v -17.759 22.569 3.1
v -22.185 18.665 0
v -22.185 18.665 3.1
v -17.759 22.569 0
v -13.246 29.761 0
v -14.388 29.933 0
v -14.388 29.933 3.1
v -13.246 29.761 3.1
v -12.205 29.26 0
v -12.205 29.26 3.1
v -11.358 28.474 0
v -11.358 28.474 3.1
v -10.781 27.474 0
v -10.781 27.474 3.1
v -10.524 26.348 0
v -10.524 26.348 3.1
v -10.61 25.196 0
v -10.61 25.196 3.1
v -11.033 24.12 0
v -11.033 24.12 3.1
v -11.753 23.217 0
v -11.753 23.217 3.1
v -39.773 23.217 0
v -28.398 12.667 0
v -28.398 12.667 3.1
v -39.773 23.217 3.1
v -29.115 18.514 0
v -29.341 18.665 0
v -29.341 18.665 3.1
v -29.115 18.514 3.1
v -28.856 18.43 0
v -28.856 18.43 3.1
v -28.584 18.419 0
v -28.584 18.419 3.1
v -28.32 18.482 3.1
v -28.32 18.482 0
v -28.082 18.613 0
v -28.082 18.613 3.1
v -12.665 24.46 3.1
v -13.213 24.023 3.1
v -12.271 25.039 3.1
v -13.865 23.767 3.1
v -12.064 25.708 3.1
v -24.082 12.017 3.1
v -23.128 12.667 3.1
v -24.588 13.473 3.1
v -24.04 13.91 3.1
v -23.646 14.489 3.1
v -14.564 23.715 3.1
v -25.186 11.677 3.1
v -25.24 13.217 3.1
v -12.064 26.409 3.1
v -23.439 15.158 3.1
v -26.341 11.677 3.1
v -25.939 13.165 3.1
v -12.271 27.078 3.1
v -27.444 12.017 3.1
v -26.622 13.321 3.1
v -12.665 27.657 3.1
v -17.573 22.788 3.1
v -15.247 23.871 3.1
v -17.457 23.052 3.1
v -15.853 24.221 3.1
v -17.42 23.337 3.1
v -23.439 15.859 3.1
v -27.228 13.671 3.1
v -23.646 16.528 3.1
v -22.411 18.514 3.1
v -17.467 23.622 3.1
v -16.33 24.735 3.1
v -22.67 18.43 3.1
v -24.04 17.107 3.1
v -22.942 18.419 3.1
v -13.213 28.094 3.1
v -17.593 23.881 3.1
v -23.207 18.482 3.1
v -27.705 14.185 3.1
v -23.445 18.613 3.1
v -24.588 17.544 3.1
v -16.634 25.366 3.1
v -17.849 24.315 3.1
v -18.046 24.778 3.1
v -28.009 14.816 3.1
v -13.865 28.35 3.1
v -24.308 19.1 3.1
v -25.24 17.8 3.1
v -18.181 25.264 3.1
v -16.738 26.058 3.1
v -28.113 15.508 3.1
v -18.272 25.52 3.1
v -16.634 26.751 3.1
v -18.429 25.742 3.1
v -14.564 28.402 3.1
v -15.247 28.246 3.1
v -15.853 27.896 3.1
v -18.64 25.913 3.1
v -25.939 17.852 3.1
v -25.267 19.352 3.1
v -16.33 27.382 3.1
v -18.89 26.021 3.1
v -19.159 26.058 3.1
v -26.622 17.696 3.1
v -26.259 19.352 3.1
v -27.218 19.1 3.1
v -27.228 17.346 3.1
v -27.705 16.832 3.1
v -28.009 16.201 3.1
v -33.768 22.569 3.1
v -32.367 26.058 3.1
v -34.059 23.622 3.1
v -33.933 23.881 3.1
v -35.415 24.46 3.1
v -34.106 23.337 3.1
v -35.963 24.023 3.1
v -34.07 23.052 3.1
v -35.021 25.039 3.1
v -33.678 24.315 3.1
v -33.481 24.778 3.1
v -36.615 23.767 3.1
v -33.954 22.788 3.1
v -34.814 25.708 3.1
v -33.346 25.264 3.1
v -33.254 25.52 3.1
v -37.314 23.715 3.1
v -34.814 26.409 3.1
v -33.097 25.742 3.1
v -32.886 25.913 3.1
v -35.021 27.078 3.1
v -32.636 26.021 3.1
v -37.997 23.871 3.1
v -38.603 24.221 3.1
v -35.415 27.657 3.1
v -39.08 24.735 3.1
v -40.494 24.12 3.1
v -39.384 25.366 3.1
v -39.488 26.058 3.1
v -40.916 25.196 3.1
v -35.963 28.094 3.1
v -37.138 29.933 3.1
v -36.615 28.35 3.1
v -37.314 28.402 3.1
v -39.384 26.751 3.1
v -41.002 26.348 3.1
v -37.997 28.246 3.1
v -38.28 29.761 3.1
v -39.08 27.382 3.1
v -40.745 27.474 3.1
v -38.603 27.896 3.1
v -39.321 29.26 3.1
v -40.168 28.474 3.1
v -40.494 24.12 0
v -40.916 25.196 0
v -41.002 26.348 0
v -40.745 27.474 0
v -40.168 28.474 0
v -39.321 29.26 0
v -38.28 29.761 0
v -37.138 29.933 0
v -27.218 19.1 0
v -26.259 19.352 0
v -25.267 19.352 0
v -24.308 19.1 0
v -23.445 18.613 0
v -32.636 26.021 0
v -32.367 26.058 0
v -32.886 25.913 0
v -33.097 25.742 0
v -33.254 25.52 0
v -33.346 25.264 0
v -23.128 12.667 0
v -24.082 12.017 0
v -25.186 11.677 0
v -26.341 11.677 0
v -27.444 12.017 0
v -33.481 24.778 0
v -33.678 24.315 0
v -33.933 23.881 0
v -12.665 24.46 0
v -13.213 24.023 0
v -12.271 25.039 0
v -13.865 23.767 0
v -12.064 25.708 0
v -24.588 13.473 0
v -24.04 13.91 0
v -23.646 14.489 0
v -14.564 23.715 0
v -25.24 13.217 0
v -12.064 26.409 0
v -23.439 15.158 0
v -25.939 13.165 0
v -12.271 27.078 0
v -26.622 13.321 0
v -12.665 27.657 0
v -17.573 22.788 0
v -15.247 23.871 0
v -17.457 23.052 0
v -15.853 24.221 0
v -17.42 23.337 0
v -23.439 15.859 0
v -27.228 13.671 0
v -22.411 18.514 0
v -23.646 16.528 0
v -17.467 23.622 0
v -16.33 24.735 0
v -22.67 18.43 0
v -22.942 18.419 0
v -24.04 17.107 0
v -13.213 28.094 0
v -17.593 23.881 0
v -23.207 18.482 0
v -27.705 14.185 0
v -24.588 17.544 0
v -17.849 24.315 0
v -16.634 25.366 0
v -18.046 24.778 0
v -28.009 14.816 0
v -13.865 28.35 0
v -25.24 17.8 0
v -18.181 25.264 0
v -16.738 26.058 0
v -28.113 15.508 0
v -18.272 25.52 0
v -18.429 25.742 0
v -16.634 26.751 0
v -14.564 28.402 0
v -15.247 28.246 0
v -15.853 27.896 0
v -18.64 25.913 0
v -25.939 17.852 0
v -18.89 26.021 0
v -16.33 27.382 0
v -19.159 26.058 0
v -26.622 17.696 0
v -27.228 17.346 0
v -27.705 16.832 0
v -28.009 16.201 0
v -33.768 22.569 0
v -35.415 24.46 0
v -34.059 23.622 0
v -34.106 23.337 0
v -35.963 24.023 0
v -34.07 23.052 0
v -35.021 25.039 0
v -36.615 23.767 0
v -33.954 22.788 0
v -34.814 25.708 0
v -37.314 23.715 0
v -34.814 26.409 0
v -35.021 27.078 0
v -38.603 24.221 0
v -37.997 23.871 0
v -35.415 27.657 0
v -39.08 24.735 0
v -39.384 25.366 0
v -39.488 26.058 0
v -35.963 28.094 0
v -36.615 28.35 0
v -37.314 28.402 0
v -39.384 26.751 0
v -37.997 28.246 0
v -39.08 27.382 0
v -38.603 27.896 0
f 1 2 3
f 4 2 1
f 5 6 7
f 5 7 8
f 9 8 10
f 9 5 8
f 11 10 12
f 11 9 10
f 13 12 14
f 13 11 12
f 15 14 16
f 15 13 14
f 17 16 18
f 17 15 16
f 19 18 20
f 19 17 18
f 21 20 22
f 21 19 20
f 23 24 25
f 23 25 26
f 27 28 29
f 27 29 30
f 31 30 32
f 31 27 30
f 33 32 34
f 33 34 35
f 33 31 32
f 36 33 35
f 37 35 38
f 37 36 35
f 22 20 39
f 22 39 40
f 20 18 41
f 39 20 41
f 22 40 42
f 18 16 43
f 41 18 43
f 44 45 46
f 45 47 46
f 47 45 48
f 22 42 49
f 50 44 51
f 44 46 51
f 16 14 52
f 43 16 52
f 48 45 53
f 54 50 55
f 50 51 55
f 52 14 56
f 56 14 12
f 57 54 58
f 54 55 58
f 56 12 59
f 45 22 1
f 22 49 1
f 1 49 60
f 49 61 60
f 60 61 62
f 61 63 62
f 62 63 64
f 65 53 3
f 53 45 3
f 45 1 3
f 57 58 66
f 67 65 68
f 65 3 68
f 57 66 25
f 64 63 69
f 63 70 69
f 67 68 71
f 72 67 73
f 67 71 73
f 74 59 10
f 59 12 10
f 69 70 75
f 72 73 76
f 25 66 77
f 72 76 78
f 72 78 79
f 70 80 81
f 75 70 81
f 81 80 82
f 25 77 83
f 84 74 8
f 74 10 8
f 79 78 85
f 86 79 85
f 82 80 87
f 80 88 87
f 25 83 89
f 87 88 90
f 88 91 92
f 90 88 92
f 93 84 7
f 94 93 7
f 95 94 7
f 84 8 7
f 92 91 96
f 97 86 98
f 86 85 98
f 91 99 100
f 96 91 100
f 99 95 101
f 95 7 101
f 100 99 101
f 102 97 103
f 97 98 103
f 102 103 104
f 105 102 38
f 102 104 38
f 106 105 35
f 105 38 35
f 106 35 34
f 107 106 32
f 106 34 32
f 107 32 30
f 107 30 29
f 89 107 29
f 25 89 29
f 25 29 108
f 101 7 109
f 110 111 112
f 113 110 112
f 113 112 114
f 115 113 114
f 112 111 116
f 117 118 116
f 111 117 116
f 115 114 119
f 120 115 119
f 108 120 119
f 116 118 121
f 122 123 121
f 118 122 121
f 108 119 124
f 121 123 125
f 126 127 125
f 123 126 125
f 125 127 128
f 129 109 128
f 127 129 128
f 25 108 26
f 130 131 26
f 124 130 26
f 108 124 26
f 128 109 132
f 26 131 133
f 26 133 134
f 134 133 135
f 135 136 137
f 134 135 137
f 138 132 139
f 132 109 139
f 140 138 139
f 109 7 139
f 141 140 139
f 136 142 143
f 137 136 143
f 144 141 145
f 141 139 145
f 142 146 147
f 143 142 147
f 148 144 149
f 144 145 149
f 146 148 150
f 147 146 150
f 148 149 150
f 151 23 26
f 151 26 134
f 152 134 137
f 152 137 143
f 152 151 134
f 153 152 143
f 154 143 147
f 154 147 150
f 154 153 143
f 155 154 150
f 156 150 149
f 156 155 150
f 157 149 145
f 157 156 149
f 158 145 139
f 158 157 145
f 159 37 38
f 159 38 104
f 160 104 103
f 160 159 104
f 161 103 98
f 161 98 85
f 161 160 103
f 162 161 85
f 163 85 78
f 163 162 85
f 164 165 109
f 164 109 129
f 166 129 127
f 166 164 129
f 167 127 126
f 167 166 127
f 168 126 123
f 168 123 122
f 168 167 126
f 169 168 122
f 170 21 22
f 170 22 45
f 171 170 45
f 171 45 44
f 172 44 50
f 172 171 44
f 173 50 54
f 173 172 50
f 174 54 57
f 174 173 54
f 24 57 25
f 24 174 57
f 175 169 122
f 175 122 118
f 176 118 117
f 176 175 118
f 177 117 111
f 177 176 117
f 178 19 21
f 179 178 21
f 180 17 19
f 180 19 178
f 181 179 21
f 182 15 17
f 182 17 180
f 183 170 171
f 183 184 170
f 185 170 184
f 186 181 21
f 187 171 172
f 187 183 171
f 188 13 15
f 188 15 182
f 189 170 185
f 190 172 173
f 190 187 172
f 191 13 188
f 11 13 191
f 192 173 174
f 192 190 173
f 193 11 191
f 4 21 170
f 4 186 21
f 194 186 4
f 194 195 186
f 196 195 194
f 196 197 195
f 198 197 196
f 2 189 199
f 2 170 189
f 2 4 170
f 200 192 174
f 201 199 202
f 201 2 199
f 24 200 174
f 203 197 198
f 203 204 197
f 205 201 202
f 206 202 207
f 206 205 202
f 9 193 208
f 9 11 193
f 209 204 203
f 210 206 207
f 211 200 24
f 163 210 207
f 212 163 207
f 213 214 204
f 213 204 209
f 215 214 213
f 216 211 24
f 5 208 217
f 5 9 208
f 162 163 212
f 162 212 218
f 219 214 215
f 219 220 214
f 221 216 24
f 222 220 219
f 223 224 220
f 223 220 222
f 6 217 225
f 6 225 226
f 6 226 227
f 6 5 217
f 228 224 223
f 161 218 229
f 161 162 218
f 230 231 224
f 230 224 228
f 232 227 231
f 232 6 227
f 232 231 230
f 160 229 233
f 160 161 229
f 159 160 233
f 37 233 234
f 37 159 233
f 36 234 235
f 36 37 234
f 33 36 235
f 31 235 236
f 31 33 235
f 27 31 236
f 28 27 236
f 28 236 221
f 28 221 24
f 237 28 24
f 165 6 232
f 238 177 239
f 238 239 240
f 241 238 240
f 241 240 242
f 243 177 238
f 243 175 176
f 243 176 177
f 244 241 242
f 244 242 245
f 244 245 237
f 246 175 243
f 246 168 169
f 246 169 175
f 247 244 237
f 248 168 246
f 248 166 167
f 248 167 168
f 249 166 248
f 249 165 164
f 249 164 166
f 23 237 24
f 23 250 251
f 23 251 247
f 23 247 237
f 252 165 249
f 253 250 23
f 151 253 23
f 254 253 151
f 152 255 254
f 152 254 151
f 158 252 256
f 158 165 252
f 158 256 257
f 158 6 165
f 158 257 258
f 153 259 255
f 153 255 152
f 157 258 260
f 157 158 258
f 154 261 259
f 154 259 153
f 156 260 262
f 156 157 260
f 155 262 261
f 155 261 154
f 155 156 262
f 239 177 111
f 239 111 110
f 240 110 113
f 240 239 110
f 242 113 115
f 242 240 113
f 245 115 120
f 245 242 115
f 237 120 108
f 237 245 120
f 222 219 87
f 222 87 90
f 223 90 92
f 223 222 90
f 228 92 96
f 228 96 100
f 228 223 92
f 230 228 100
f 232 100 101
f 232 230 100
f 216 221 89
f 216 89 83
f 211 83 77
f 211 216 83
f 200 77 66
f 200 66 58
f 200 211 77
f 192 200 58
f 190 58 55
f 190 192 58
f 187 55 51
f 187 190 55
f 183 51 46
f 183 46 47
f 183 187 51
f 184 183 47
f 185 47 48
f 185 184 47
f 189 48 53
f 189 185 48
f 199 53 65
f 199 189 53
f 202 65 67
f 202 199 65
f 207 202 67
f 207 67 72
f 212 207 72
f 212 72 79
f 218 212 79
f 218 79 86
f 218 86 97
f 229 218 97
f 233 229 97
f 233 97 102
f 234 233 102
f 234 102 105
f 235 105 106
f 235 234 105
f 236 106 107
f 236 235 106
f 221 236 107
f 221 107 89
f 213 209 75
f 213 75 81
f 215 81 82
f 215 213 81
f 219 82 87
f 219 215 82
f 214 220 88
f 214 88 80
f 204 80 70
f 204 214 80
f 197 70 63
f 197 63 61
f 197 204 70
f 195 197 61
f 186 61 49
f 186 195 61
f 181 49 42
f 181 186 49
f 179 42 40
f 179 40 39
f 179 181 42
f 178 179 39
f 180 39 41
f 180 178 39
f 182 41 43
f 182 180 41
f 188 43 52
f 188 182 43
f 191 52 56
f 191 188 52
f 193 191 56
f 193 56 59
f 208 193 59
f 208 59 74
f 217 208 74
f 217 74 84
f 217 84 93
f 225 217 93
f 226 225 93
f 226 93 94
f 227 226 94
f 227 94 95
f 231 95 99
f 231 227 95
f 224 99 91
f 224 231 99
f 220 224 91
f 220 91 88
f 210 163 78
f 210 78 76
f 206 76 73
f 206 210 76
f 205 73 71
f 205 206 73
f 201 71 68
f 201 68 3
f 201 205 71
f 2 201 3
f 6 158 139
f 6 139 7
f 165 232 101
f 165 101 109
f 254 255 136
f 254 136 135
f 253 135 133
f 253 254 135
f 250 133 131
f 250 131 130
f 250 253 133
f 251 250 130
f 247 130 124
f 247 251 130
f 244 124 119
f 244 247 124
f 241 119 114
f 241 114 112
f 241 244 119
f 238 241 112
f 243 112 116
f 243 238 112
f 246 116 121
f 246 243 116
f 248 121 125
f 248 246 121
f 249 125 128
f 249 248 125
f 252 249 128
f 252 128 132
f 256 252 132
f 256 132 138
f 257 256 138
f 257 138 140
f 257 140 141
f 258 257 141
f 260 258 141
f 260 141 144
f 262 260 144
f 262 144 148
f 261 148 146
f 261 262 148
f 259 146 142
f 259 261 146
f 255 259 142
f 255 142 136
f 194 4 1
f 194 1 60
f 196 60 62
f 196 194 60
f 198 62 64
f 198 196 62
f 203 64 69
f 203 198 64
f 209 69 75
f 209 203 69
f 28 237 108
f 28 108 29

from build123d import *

# Parameters (mm, degrees)
SKETCH1_R      = 2.35
EXTRUDE1_DEPTH = 3.1


with BuildPart() as part:
    # Sketch1 → Extrude1 (new body)
    with BuildSketch(Plane.XY):
        with BuildLine():
            Line((-37.138157114, 29.933489293), (-14.388157114, 29.933489293))
            ThreePointArc((-14.388157114, 29.933489293), (-10.78087227, 27.473805885), (-11.7530861, 23.217358224))
            Line((-11.7530861, 23.217358224), (-23.1280861, 12.667358224))
            ThreePointArc((-23.1280861, 12.667358224), (-25.763157114, 11.633489293), (-28.398228128, 12.667358224))
            Line((-28.398228128, 12.667358224), (-39.773228128, 23.217358224))
            ThreePointArc((-39.773228128, 23.217358224), (-40.745441958, 27.473805885), (-37.138157114, 29.933489293))
        make_face()
        with Locations(Location((-14.388157114, 26.058489293, 0), (0, 0, 180))):
            Circle(SKETCH1_R, mode=Mode.SUBTRACT)
        with Locations(Location((-37.138157114, 26.058489293, 0), (0, 0, 180))):
            Circle(SKETCH1_R, mode=Mode.SUBTRACT)
        with Locations(Location((-25.763157114, 15.508489293, 0), (0, 0, 180))):
            Circle(SKETCH1_R, mode=Mode.SUBTRACT)
        with BuildLine():
            Line((-33.76750302, 22.568552775), (-29.341459115, 18.664654654))
            ThreePointArc((-29.341459115, 18.664654654), (-28.720659193, 18.415441082), (-28.081652728, 18.613356938))
            ThreePointArc((-28.081652728, 18.613356938), (-25.763157114, 19.383489293), (-23.4446615, 18.613356938))
            ThreePointArc((-23.4446615, 18.613356938), (-22.805655035, 18.415441082), (-22.184855112, 18.664654654))
            Line((-22.184855112, 18.664654654), (-17.758811208, 22.568552775))
            ThreePointArc((-17.758811208, 22.568552775), (-17.428169762, 23.19327051), (-17.593190704, 23.880558008))
            ThreePointArc((-17.593190704, 23.880558008), (-17.954657824, 24.543333299), (-18.180755673, 25.263617499))
            ThreePointArc((-18.180755673, 25.263617499), (-18.529065613, 25.834739319), (-19.159490785, 26.058489293))
            Line((-19.159490785, 26.058489293), (-32.366823443, 26.058489293))
            ThreePointArc((-32.366823443, 26.058489293), (-32.997248615, 25.834739319), (-33.345558555, 25.263617499))
            ThreePointArc((-33.345558555, 25.263617499), (-33.571656404, 24.543333299), (-33.933123524, 23.880558008))
            ThreePointArc((-33.933123524, 23.880558008), (-34.098144466, 23.19327051), (-33.76750302, 22.568552775))
        make_face(mode=Mode.SUBTRACT)
    extrude(amount=EXTRUDE1_DEPTH)


solid = part.part
